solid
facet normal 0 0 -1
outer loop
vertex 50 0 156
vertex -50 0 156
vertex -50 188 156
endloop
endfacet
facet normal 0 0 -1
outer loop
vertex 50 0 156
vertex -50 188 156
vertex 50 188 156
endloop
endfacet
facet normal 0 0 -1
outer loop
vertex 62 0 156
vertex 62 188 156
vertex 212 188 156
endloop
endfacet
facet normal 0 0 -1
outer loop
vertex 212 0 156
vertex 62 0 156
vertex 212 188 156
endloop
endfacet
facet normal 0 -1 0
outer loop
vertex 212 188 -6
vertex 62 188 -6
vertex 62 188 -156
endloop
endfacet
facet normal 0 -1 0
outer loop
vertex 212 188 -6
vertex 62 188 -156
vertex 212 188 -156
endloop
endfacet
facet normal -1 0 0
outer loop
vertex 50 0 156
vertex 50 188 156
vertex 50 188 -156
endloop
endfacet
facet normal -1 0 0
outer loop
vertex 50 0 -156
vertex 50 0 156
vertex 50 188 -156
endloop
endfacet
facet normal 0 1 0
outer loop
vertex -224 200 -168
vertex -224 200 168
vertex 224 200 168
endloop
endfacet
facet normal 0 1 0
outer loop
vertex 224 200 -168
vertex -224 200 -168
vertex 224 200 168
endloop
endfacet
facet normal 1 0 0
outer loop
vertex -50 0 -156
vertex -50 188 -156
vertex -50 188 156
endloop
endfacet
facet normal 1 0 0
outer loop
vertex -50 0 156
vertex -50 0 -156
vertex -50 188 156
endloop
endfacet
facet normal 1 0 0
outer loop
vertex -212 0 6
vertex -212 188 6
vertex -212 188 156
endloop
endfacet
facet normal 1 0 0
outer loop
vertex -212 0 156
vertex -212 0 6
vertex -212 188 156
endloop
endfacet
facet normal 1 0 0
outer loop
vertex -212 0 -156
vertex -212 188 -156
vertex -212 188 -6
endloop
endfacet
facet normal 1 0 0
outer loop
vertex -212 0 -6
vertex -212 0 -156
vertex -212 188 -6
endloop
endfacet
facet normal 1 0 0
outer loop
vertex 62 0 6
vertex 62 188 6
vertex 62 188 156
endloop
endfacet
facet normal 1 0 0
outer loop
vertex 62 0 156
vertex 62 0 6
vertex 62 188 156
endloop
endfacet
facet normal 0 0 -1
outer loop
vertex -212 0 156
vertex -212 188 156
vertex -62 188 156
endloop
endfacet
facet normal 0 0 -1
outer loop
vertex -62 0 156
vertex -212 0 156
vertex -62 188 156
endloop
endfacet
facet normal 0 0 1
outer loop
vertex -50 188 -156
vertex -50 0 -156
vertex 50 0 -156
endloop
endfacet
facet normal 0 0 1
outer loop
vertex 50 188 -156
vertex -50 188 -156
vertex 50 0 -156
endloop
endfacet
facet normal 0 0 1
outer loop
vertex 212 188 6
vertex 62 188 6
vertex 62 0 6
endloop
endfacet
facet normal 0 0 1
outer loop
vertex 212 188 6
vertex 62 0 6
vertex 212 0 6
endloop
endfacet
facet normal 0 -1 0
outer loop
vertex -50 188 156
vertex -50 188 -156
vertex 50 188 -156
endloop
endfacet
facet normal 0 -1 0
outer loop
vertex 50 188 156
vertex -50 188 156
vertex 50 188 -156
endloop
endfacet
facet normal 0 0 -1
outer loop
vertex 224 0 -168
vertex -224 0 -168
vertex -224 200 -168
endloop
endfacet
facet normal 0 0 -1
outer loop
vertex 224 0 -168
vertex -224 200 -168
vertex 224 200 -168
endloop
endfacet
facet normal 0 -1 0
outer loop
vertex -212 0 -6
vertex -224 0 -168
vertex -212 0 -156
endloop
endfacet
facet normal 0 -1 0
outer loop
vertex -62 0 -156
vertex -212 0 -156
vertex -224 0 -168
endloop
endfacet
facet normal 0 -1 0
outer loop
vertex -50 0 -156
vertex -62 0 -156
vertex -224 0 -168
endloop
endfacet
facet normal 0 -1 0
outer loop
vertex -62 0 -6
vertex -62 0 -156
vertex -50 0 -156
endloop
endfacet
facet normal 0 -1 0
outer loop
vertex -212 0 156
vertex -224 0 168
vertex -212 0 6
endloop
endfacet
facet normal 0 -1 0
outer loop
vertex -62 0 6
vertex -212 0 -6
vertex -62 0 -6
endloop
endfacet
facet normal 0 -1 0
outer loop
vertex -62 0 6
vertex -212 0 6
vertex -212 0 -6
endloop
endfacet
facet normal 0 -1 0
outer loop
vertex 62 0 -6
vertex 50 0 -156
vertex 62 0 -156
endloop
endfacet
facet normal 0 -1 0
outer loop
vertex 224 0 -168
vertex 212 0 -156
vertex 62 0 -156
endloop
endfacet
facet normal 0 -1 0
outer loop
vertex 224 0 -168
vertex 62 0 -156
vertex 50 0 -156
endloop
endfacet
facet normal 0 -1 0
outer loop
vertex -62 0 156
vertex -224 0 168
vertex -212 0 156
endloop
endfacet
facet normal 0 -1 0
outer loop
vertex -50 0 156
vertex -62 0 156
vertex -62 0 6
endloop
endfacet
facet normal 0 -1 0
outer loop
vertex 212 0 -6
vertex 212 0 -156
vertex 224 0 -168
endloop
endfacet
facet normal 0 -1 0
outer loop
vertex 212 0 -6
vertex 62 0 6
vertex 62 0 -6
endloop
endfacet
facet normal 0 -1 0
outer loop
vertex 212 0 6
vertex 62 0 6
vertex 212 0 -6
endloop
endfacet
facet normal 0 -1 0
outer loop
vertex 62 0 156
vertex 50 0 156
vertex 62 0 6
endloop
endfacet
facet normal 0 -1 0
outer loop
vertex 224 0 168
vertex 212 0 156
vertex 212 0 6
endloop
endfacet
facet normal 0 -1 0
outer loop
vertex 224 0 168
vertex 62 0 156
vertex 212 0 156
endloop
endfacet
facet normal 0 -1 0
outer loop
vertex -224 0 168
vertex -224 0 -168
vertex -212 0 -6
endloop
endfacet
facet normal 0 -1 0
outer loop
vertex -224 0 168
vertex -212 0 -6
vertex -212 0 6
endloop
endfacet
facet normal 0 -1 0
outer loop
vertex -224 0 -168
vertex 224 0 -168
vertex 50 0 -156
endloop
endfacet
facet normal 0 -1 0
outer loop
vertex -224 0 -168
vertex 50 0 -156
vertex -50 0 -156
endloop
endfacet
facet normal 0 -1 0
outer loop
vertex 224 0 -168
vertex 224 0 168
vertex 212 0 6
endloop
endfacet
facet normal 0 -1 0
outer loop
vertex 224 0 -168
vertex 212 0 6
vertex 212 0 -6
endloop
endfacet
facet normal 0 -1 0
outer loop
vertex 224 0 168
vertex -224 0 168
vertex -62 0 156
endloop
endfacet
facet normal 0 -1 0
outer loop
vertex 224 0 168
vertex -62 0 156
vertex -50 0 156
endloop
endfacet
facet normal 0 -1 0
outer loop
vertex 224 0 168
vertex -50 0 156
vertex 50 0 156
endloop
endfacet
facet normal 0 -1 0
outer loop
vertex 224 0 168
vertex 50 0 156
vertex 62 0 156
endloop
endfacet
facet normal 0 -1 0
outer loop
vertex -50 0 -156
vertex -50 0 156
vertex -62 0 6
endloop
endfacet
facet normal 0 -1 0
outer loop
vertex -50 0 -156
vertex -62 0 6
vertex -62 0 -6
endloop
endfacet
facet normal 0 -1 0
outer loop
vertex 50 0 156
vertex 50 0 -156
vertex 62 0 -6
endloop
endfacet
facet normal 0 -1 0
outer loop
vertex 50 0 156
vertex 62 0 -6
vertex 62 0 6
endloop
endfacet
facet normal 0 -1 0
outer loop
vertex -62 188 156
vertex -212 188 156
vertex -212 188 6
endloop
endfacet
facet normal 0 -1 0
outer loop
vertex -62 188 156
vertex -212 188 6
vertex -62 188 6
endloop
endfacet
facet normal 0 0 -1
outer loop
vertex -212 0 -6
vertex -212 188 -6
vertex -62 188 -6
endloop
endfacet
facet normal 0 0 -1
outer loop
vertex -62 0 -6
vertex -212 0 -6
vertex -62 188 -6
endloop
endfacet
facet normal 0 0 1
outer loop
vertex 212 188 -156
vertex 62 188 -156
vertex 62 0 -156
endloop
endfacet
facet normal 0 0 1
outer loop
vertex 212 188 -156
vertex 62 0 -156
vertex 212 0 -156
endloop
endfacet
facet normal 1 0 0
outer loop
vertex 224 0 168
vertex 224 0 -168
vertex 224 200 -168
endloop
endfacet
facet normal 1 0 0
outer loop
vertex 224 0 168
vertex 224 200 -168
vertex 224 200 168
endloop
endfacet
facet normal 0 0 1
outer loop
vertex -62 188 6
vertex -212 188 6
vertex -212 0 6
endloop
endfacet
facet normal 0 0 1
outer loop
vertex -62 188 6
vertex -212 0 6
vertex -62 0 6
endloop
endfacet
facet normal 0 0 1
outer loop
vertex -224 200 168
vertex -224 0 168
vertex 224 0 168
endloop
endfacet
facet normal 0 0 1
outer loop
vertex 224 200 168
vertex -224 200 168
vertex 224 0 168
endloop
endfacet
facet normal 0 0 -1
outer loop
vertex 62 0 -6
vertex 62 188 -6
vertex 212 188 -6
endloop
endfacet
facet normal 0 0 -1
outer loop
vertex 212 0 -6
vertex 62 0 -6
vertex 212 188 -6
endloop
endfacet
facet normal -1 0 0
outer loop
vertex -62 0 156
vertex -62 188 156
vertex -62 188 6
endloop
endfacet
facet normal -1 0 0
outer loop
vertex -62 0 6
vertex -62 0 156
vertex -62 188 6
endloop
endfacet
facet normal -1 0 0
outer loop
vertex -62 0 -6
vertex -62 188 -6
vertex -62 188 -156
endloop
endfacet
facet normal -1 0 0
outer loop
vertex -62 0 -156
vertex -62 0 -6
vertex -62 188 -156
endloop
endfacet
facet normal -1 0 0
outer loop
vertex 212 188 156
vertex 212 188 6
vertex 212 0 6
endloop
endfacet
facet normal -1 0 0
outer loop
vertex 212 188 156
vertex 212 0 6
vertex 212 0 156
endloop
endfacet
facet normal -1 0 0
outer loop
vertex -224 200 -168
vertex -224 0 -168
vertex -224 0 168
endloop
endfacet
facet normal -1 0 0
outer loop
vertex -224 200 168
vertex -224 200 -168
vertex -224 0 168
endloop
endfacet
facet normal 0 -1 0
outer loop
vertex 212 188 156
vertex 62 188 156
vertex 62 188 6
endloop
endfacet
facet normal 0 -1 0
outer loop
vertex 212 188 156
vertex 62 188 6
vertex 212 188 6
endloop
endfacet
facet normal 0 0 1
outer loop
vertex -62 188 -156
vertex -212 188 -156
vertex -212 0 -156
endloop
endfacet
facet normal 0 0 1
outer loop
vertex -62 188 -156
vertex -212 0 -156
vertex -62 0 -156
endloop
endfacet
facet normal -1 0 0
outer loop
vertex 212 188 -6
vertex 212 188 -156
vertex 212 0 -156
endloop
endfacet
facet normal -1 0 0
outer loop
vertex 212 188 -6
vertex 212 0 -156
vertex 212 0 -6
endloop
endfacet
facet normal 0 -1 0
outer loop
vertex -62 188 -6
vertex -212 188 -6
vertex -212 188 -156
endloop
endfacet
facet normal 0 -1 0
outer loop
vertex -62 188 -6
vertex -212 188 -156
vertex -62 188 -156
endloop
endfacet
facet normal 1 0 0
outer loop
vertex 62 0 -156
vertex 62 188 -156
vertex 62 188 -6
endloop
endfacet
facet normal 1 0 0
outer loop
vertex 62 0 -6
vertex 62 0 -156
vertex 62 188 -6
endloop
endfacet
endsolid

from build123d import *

# Parameters (mm, degrees)
F0_W     = 448
F0_H     = 336
F1_DEPTH = 200
F2_T     = -12
F3_W     = 150
F3_H     = 12
F4_DEPTH = 188


with BuildPart() as f1:
    # F0 (on Front) → F1 (new body)
    with BuildSketch(Plane.XZ):
        Rectangle(F0_W, F0_H)
    extrude(amount=-F1_DEPTH)

    # F2
    f2_openings = [f1.faces().sort_by_distance(p)[0] for p in [
        (0, 0, 0),
    ]]
    offset(amount=F2_T, openings=f2_openings)

    # F3 (on face) → F4 (join)
    with BuildSketch(Plane.XZ.offset(-188)):
        with Locations((-137, 0)):
            Rectangle(F3_W, F3_H)
        Polygon((-50, 156), (-62, 156), (-62, 6), (-62, -6), (-62, -156), (-50, -156), align=None)
        Polygon((62, 156), (50, 156), (50, -156), (62, -156), (62, -6), (62, 6), align=None)
        with Locations((137, 0)):
            Rectangle(F3_W, F3_H)
    extrude(amount=F4_DEPTH)


solid = f1.part
